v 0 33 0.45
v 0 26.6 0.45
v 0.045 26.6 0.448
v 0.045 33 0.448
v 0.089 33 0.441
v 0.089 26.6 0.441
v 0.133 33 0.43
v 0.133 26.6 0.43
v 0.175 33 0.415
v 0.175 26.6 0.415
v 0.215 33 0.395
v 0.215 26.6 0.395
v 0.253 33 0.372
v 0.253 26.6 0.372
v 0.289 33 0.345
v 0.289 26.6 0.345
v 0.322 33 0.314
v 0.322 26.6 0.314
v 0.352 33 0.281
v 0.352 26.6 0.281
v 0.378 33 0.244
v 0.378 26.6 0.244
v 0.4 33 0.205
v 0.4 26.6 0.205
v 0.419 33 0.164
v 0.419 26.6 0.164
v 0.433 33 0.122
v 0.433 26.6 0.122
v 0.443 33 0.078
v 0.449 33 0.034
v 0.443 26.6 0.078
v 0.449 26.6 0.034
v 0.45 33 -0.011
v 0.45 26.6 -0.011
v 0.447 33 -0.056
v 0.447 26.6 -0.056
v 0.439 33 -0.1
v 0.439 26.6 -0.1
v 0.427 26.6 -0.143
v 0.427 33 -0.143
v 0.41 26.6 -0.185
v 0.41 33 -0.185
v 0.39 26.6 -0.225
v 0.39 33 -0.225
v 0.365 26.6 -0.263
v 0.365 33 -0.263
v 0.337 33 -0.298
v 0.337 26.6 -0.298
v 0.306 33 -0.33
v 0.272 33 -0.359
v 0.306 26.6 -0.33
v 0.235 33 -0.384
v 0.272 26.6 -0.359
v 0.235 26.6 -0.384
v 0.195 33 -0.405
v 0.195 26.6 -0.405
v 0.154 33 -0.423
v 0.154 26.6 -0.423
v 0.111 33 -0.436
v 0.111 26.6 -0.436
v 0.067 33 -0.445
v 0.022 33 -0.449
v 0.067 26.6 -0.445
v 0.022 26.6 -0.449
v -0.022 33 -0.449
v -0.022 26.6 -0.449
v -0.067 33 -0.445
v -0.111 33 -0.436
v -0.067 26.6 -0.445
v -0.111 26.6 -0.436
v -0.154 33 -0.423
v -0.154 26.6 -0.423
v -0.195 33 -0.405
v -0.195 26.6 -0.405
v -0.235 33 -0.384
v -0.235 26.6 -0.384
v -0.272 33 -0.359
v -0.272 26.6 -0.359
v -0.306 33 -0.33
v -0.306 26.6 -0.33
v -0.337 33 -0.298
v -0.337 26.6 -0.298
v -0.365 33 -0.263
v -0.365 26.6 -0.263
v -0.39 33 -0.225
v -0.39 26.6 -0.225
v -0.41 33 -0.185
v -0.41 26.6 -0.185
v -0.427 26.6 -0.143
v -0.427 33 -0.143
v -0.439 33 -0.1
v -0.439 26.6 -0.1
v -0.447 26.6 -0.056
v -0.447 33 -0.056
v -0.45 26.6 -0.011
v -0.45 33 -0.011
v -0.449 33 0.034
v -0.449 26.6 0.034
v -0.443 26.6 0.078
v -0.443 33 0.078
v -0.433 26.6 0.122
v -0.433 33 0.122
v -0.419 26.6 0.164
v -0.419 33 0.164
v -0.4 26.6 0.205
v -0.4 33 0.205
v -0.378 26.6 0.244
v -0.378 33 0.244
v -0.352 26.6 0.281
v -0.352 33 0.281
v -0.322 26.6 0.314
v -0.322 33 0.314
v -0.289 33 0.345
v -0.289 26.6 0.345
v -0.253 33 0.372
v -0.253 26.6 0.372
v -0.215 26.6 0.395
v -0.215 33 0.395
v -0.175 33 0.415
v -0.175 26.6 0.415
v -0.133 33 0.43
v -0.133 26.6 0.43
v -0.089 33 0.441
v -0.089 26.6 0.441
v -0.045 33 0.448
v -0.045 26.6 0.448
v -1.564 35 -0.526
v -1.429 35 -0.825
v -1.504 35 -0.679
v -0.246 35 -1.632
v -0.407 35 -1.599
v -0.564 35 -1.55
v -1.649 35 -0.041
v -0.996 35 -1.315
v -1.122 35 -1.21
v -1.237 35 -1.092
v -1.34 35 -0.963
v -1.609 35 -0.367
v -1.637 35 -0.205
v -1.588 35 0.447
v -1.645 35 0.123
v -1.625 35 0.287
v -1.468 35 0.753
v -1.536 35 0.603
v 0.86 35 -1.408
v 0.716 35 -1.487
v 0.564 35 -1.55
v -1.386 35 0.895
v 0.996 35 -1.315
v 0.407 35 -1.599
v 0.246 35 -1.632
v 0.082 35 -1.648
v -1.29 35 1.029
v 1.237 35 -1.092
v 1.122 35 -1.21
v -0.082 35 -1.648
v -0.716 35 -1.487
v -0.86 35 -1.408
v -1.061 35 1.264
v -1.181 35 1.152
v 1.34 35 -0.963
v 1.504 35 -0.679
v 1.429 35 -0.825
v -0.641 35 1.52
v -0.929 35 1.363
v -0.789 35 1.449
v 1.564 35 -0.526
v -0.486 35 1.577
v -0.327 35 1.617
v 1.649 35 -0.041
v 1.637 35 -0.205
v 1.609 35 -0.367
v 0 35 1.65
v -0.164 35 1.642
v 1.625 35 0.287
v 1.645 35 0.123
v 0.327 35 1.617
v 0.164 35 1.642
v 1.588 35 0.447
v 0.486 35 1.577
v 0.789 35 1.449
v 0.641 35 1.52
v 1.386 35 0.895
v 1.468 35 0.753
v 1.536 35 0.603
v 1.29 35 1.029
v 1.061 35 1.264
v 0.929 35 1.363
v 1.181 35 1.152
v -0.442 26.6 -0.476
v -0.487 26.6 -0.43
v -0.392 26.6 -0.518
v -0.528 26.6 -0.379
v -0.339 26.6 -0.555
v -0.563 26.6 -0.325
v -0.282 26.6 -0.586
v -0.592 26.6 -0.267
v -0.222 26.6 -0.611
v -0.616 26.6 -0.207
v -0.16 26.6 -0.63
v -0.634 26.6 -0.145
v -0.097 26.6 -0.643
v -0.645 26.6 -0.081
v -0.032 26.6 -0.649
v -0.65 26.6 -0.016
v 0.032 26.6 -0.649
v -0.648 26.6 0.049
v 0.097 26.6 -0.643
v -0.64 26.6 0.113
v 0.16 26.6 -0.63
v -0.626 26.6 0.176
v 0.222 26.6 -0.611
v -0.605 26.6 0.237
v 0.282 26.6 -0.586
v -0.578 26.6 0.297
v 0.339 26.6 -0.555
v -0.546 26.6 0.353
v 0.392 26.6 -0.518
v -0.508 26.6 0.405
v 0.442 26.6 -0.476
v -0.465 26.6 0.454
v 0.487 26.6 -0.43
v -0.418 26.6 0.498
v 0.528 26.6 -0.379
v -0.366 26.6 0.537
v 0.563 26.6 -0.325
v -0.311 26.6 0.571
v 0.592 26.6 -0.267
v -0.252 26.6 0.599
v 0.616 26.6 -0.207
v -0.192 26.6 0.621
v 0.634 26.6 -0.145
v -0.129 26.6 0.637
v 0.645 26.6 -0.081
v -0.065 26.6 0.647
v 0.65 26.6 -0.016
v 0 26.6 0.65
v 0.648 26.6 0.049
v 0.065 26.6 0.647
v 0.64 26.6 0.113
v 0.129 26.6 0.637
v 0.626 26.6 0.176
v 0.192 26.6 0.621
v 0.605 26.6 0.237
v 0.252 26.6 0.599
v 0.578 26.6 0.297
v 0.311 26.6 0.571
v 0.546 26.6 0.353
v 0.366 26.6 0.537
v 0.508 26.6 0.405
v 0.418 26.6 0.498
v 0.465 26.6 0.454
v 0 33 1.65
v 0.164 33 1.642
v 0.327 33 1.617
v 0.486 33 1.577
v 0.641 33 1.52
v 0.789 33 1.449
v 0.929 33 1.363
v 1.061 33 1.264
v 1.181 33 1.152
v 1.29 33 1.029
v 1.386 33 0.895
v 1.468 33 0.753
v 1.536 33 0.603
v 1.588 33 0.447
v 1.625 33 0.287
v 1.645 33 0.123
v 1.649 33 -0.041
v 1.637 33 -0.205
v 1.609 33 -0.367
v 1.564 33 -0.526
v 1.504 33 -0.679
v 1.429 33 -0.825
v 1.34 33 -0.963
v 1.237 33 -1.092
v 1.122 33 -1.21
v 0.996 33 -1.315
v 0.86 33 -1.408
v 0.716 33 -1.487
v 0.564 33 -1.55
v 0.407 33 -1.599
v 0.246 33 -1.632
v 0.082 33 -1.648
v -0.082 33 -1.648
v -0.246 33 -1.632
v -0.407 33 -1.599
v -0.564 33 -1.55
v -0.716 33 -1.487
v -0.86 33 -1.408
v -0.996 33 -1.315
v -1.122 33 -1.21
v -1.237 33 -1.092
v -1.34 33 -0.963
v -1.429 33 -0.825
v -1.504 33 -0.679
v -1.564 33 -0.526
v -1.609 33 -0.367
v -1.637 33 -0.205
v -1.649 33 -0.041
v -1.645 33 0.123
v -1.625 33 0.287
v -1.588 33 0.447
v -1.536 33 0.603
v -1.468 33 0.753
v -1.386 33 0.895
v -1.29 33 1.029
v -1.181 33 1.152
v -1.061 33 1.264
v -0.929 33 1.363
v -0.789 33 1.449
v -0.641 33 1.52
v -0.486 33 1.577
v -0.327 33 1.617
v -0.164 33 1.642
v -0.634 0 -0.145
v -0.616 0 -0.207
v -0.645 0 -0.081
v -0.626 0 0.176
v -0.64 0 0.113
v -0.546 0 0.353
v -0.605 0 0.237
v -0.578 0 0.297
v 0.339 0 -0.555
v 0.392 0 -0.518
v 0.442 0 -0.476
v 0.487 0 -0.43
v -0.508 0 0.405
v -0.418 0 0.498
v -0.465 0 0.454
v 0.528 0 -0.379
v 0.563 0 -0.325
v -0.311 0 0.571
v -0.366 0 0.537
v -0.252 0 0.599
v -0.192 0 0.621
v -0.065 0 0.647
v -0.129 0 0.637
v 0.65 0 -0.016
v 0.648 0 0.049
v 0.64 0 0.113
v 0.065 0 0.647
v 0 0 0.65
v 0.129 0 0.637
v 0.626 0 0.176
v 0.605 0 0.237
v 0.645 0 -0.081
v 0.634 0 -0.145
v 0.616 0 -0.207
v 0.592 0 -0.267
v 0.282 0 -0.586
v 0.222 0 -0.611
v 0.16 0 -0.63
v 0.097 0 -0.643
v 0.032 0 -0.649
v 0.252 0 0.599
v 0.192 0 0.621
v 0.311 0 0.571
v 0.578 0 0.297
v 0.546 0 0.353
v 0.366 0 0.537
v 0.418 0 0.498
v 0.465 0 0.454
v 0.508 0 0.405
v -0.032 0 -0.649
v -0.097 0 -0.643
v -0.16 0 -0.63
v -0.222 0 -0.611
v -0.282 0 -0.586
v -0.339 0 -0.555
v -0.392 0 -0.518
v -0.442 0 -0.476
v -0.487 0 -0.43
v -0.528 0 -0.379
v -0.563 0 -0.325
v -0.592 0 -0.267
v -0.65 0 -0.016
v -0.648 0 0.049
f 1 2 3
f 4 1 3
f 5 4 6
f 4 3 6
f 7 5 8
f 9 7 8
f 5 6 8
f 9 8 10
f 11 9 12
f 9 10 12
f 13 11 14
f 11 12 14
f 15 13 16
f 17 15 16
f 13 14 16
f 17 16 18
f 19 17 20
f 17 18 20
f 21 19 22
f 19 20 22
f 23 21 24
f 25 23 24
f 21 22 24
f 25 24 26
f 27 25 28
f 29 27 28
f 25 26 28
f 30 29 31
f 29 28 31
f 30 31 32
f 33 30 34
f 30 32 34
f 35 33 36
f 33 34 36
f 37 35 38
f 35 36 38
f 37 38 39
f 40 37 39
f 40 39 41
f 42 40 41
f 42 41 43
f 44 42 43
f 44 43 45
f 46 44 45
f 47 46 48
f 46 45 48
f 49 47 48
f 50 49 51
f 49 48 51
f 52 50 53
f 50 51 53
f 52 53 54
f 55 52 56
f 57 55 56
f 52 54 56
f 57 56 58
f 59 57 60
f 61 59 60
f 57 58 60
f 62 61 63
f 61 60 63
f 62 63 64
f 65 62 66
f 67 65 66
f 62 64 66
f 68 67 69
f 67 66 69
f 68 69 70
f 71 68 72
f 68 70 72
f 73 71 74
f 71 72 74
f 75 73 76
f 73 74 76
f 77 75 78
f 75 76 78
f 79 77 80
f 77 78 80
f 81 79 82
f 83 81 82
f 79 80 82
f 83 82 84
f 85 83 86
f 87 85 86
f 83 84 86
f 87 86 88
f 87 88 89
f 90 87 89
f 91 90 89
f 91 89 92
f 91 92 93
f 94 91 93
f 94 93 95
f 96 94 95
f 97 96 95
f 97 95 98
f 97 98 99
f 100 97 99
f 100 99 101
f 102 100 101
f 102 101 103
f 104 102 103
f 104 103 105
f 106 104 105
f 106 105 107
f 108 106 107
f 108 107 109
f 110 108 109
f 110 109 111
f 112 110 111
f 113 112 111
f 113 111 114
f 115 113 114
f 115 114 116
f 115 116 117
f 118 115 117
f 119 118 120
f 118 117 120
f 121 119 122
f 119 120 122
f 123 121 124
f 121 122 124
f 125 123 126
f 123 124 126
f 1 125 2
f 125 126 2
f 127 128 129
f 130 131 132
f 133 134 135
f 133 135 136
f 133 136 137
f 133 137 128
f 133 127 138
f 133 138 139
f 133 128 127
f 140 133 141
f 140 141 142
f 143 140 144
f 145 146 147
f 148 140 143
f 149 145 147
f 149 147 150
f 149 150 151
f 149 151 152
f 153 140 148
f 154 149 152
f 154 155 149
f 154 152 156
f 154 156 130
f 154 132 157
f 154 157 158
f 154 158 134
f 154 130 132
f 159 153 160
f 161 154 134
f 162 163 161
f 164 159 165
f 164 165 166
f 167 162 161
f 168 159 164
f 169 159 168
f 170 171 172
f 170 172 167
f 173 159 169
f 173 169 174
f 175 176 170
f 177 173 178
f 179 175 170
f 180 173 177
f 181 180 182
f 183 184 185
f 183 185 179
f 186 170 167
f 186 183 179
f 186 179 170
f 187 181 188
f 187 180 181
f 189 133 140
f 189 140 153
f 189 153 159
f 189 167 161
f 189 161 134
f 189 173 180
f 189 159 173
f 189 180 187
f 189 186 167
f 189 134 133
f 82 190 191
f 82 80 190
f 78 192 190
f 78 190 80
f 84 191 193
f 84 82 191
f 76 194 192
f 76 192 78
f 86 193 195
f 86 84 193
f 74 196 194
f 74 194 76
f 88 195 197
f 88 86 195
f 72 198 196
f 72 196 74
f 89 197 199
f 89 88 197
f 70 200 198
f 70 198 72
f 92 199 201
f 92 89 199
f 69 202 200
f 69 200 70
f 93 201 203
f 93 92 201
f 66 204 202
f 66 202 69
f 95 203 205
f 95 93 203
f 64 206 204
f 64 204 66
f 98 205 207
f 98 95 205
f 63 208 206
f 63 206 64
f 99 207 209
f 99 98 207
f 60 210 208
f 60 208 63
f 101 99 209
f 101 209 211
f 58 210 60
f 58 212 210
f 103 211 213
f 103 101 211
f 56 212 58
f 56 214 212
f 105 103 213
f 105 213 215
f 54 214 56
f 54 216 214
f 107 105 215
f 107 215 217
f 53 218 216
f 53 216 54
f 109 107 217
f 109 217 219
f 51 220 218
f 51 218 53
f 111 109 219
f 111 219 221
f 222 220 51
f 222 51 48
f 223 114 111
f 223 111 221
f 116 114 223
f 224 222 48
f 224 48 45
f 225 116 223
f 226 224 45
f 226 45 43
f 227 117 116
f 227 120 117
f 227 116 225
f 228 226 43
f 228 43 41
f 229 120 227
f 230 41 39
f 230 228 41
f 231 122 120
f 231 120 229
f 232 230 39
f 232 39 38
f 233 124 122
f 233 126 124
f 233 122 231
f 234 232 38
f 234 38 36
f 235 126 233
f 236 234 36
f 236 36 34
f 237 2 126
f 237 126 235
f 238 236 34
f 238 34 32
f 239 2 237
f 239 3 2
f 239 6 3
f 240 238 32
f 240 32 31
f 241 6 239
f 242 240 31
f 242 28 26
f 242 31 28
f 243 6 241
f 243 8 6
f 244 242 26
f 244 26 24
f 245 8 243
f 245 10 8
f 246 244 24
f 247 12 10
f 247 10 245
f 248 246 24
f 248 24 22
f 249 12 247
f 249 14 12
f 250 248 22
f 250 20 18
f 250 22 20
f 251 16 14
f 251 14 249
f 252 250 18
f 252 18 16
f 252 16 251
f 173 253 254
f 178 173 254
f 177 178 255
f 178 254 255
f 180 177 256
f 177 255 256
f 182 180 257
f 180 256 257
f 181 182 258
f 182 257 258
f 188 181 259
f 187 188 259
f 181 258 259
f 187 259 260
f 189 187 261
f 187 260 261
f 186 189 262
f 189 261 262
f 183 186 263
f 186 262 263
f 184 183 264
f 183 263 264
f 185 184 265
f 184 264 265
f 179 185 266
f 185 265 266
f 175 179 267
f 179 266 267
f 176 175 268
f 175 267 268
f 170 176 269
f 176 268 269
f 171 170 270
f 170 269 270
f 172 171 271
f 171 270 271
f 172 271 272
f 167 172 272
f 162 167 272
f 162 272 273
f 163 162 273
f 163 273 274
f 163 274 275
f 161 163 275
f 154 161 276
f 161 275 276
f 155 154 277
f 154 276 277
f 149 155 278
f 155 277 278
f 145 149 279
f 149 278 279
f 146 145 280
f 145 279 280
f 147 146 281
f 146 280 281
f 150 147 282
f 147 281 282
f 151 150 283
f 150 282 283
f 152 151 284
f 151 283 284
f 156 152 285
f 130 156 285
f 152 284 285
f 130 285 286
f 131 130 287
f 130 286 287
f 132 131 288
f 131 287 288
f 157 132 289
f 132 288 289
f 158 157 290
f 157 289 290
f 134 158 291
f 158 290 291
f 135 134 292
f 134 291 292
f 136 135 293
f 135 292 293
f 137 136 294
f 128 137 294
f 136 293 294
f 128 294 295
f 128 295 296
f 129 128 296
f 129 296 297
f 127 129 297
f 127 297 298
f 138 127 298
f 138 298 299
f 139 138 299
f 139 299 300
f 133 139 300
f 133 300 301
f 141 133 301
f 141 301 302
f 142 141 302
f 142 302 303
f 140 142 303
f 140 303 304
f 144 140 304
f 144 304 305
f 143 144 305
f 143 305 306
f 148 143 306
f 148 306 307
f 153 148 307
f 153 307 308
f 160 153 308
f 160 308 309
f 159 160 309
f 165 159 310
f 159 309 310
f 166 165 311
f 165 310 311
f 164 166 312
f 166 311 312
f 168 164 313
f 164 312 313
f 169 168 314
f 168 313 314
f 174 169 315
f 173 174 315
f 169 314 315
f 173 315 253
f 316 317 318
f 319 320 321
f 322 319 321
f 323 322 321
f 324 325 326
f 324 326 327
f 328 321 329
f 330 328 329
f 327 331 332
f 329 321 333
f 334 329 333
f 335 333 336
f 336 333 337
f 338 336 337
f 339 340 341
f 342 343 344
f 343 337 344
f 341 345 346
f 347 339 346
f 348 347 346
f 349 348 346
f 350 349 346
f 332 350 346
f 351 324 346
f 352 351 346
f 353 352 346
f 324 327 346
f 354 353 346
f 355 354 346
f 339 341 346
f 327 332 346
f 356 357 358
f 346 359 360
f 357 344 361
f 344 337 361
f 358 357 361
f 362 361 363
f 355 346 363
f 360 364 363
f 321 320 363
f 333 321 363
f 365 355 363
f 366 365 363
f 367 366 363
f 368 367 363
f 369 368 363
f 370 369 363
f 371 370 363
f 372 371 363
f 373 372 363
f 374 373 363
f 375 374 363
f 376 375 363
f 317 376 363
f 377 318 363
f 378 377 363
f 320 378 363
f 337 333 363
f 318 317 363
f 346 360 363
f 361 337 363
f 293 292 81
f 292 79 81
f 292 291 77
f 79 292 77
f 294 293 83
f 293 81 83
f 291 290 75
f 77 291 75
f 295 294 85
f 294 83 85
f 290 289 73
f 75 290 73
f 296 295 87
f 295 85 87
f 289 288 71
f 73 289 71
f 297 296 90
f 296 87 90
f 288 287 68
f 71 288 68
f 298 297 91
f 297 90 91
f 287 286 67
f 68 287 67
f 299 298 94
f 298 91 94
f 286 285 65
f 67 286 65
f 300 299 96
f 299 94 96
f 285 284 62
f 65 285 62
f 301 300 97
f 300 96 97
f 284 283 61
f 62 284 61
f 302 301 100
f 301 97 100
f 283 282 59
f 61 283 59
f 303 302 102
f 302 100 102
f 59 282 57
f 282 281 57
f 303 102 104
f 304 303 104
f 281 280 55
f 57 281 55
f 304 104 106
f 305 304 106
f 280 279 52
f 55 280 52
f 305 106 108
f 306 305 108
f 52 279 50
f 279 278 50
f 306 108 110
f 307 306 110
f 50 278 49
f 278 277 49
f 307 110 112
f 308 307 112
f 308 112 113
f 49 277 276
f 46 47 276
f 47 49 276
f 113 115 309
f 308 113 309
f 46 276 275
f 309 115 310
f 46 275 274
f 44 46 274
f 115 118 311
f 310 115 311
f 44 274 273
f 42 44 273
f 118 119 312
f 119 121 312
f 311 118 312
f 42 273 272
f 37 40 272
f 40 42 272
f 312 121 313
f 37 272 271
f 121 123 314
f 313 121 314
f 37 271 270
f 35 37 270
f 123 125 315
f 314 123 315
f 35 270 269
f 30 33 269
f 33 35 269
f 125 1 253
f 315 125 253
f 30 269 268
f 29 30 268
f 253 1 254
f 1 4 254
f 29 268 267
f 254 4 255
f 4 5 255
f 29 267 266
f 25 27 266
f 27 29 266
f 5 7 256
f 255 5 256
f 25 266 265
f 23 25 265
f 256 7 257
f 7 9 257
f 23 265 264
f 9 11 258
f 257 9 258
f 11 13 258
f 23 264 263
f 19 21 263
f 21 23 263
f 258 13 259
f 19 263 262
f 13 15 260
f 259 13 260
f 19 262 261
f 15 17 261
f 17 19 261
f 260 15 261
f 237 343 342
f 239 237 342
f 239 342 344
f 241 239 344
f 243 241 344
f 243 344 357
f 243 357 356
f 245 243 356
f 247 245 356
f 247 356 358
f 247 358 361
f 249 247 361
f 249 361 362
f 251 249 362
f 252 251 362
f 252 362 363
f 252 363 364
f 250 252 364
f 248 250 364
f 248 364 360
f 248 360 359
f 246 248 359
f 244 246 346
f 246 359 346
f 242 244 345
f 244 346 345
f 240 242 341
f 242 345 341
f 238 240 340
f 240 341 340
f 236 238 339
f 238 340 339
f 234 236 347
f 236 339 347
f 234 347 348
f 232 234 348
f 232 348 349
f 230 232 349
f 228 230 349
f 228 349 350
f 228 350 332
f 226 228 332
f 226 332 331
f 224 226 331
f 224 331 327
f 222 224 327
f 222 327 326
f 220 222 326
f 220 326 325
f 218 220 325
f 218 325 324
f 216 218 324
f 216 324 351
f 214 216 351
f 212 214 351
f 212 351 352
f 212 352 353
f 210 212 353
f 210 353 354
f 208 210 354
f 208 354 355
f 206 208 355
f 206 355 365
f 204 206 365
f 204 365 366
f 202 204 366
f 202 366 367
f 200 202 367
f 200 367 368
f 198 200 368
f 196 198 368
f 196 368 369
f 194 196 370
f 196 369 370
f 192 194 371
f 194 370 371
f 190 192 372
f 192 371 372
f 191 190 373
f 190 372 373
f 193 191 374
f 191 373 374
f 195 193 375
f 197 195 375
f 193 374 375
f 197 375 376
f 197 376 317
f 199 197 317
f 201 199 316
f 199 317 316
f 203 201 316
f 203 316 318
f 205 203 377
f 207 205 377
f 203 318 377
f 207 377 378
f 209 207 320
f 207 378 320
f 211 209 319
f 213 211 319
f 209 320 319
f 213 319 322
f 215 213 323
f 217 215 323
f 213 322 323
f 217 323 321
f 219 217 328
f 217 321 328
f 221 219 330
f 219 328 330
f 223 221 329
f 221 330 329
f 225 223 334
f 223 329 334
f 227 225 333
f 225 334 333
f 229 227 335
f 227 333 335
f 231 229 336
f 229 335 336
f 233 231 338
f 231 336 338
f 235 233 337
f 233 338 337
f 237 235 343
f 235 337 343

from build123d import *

# Parameters (mm, degrees)
SKETCH_2_R          = 0.65
EXTRUDE_1_DEPTH     = 33
CUT_EXTRUDE_START   = -6.4
SKETCH_3_R          = 0.65
SKETCH_3_R_2        = 0.45
CUT_EXTRUDE_2_DEPTH = 6.4
SKETCH_5_R          = 1.65
EXTRUDE_2_DEPTH     = 2


with BuildPart() as part:
    # 草图2 → 凸台-拉伸1 (new body)
    with BuildSketch(Plane(origin=(0, 0, 0), x_dir=(1, 0, 0), z_dir=(0, 1, 0))):
        with Locations(Location((0, 0, 0), (0, 0, 270))):
            Circle(SKETCH_2_R)
    extrude(amount=EXTRUDE_1_DEPTH)

    # 草图3 → 切除-拉伸2 (cut)
    with BuildSketch(Plane(origin=(0, 33, 0), x_dir=(1, 0, 0), z_dir=(0, 1, 0)).offset(CUT_EXTRUDE_START)):
        with Locations(Location((0, 0, 0), (0, 0, 270))):
            Circle(SKETCH_3_R)
        with Locations(Location((0, 0, 0), (0, 0, 270))):
            Circle(SKETCH_3_R_2, mode=Mode.SUBTRACT)
    extrude(amount=CUT_EXTRUDE_2_DEPTH, mode=Mode.SUBTRACT)

    # 草图5 → 凸台-拉伸2 (add)
    with BuildSketch(Plane(origin=(0, 33, 0), x_dir=(1, 0, 0), z_dir=(0, 1, 0))):
        with Locations(Location((0, 0, 0), (0, 0, 270))):
            Circle(SKETCH_5_R)
    extrude(amount=EXTRUDE_2_DEPTH)


solid = part.part
